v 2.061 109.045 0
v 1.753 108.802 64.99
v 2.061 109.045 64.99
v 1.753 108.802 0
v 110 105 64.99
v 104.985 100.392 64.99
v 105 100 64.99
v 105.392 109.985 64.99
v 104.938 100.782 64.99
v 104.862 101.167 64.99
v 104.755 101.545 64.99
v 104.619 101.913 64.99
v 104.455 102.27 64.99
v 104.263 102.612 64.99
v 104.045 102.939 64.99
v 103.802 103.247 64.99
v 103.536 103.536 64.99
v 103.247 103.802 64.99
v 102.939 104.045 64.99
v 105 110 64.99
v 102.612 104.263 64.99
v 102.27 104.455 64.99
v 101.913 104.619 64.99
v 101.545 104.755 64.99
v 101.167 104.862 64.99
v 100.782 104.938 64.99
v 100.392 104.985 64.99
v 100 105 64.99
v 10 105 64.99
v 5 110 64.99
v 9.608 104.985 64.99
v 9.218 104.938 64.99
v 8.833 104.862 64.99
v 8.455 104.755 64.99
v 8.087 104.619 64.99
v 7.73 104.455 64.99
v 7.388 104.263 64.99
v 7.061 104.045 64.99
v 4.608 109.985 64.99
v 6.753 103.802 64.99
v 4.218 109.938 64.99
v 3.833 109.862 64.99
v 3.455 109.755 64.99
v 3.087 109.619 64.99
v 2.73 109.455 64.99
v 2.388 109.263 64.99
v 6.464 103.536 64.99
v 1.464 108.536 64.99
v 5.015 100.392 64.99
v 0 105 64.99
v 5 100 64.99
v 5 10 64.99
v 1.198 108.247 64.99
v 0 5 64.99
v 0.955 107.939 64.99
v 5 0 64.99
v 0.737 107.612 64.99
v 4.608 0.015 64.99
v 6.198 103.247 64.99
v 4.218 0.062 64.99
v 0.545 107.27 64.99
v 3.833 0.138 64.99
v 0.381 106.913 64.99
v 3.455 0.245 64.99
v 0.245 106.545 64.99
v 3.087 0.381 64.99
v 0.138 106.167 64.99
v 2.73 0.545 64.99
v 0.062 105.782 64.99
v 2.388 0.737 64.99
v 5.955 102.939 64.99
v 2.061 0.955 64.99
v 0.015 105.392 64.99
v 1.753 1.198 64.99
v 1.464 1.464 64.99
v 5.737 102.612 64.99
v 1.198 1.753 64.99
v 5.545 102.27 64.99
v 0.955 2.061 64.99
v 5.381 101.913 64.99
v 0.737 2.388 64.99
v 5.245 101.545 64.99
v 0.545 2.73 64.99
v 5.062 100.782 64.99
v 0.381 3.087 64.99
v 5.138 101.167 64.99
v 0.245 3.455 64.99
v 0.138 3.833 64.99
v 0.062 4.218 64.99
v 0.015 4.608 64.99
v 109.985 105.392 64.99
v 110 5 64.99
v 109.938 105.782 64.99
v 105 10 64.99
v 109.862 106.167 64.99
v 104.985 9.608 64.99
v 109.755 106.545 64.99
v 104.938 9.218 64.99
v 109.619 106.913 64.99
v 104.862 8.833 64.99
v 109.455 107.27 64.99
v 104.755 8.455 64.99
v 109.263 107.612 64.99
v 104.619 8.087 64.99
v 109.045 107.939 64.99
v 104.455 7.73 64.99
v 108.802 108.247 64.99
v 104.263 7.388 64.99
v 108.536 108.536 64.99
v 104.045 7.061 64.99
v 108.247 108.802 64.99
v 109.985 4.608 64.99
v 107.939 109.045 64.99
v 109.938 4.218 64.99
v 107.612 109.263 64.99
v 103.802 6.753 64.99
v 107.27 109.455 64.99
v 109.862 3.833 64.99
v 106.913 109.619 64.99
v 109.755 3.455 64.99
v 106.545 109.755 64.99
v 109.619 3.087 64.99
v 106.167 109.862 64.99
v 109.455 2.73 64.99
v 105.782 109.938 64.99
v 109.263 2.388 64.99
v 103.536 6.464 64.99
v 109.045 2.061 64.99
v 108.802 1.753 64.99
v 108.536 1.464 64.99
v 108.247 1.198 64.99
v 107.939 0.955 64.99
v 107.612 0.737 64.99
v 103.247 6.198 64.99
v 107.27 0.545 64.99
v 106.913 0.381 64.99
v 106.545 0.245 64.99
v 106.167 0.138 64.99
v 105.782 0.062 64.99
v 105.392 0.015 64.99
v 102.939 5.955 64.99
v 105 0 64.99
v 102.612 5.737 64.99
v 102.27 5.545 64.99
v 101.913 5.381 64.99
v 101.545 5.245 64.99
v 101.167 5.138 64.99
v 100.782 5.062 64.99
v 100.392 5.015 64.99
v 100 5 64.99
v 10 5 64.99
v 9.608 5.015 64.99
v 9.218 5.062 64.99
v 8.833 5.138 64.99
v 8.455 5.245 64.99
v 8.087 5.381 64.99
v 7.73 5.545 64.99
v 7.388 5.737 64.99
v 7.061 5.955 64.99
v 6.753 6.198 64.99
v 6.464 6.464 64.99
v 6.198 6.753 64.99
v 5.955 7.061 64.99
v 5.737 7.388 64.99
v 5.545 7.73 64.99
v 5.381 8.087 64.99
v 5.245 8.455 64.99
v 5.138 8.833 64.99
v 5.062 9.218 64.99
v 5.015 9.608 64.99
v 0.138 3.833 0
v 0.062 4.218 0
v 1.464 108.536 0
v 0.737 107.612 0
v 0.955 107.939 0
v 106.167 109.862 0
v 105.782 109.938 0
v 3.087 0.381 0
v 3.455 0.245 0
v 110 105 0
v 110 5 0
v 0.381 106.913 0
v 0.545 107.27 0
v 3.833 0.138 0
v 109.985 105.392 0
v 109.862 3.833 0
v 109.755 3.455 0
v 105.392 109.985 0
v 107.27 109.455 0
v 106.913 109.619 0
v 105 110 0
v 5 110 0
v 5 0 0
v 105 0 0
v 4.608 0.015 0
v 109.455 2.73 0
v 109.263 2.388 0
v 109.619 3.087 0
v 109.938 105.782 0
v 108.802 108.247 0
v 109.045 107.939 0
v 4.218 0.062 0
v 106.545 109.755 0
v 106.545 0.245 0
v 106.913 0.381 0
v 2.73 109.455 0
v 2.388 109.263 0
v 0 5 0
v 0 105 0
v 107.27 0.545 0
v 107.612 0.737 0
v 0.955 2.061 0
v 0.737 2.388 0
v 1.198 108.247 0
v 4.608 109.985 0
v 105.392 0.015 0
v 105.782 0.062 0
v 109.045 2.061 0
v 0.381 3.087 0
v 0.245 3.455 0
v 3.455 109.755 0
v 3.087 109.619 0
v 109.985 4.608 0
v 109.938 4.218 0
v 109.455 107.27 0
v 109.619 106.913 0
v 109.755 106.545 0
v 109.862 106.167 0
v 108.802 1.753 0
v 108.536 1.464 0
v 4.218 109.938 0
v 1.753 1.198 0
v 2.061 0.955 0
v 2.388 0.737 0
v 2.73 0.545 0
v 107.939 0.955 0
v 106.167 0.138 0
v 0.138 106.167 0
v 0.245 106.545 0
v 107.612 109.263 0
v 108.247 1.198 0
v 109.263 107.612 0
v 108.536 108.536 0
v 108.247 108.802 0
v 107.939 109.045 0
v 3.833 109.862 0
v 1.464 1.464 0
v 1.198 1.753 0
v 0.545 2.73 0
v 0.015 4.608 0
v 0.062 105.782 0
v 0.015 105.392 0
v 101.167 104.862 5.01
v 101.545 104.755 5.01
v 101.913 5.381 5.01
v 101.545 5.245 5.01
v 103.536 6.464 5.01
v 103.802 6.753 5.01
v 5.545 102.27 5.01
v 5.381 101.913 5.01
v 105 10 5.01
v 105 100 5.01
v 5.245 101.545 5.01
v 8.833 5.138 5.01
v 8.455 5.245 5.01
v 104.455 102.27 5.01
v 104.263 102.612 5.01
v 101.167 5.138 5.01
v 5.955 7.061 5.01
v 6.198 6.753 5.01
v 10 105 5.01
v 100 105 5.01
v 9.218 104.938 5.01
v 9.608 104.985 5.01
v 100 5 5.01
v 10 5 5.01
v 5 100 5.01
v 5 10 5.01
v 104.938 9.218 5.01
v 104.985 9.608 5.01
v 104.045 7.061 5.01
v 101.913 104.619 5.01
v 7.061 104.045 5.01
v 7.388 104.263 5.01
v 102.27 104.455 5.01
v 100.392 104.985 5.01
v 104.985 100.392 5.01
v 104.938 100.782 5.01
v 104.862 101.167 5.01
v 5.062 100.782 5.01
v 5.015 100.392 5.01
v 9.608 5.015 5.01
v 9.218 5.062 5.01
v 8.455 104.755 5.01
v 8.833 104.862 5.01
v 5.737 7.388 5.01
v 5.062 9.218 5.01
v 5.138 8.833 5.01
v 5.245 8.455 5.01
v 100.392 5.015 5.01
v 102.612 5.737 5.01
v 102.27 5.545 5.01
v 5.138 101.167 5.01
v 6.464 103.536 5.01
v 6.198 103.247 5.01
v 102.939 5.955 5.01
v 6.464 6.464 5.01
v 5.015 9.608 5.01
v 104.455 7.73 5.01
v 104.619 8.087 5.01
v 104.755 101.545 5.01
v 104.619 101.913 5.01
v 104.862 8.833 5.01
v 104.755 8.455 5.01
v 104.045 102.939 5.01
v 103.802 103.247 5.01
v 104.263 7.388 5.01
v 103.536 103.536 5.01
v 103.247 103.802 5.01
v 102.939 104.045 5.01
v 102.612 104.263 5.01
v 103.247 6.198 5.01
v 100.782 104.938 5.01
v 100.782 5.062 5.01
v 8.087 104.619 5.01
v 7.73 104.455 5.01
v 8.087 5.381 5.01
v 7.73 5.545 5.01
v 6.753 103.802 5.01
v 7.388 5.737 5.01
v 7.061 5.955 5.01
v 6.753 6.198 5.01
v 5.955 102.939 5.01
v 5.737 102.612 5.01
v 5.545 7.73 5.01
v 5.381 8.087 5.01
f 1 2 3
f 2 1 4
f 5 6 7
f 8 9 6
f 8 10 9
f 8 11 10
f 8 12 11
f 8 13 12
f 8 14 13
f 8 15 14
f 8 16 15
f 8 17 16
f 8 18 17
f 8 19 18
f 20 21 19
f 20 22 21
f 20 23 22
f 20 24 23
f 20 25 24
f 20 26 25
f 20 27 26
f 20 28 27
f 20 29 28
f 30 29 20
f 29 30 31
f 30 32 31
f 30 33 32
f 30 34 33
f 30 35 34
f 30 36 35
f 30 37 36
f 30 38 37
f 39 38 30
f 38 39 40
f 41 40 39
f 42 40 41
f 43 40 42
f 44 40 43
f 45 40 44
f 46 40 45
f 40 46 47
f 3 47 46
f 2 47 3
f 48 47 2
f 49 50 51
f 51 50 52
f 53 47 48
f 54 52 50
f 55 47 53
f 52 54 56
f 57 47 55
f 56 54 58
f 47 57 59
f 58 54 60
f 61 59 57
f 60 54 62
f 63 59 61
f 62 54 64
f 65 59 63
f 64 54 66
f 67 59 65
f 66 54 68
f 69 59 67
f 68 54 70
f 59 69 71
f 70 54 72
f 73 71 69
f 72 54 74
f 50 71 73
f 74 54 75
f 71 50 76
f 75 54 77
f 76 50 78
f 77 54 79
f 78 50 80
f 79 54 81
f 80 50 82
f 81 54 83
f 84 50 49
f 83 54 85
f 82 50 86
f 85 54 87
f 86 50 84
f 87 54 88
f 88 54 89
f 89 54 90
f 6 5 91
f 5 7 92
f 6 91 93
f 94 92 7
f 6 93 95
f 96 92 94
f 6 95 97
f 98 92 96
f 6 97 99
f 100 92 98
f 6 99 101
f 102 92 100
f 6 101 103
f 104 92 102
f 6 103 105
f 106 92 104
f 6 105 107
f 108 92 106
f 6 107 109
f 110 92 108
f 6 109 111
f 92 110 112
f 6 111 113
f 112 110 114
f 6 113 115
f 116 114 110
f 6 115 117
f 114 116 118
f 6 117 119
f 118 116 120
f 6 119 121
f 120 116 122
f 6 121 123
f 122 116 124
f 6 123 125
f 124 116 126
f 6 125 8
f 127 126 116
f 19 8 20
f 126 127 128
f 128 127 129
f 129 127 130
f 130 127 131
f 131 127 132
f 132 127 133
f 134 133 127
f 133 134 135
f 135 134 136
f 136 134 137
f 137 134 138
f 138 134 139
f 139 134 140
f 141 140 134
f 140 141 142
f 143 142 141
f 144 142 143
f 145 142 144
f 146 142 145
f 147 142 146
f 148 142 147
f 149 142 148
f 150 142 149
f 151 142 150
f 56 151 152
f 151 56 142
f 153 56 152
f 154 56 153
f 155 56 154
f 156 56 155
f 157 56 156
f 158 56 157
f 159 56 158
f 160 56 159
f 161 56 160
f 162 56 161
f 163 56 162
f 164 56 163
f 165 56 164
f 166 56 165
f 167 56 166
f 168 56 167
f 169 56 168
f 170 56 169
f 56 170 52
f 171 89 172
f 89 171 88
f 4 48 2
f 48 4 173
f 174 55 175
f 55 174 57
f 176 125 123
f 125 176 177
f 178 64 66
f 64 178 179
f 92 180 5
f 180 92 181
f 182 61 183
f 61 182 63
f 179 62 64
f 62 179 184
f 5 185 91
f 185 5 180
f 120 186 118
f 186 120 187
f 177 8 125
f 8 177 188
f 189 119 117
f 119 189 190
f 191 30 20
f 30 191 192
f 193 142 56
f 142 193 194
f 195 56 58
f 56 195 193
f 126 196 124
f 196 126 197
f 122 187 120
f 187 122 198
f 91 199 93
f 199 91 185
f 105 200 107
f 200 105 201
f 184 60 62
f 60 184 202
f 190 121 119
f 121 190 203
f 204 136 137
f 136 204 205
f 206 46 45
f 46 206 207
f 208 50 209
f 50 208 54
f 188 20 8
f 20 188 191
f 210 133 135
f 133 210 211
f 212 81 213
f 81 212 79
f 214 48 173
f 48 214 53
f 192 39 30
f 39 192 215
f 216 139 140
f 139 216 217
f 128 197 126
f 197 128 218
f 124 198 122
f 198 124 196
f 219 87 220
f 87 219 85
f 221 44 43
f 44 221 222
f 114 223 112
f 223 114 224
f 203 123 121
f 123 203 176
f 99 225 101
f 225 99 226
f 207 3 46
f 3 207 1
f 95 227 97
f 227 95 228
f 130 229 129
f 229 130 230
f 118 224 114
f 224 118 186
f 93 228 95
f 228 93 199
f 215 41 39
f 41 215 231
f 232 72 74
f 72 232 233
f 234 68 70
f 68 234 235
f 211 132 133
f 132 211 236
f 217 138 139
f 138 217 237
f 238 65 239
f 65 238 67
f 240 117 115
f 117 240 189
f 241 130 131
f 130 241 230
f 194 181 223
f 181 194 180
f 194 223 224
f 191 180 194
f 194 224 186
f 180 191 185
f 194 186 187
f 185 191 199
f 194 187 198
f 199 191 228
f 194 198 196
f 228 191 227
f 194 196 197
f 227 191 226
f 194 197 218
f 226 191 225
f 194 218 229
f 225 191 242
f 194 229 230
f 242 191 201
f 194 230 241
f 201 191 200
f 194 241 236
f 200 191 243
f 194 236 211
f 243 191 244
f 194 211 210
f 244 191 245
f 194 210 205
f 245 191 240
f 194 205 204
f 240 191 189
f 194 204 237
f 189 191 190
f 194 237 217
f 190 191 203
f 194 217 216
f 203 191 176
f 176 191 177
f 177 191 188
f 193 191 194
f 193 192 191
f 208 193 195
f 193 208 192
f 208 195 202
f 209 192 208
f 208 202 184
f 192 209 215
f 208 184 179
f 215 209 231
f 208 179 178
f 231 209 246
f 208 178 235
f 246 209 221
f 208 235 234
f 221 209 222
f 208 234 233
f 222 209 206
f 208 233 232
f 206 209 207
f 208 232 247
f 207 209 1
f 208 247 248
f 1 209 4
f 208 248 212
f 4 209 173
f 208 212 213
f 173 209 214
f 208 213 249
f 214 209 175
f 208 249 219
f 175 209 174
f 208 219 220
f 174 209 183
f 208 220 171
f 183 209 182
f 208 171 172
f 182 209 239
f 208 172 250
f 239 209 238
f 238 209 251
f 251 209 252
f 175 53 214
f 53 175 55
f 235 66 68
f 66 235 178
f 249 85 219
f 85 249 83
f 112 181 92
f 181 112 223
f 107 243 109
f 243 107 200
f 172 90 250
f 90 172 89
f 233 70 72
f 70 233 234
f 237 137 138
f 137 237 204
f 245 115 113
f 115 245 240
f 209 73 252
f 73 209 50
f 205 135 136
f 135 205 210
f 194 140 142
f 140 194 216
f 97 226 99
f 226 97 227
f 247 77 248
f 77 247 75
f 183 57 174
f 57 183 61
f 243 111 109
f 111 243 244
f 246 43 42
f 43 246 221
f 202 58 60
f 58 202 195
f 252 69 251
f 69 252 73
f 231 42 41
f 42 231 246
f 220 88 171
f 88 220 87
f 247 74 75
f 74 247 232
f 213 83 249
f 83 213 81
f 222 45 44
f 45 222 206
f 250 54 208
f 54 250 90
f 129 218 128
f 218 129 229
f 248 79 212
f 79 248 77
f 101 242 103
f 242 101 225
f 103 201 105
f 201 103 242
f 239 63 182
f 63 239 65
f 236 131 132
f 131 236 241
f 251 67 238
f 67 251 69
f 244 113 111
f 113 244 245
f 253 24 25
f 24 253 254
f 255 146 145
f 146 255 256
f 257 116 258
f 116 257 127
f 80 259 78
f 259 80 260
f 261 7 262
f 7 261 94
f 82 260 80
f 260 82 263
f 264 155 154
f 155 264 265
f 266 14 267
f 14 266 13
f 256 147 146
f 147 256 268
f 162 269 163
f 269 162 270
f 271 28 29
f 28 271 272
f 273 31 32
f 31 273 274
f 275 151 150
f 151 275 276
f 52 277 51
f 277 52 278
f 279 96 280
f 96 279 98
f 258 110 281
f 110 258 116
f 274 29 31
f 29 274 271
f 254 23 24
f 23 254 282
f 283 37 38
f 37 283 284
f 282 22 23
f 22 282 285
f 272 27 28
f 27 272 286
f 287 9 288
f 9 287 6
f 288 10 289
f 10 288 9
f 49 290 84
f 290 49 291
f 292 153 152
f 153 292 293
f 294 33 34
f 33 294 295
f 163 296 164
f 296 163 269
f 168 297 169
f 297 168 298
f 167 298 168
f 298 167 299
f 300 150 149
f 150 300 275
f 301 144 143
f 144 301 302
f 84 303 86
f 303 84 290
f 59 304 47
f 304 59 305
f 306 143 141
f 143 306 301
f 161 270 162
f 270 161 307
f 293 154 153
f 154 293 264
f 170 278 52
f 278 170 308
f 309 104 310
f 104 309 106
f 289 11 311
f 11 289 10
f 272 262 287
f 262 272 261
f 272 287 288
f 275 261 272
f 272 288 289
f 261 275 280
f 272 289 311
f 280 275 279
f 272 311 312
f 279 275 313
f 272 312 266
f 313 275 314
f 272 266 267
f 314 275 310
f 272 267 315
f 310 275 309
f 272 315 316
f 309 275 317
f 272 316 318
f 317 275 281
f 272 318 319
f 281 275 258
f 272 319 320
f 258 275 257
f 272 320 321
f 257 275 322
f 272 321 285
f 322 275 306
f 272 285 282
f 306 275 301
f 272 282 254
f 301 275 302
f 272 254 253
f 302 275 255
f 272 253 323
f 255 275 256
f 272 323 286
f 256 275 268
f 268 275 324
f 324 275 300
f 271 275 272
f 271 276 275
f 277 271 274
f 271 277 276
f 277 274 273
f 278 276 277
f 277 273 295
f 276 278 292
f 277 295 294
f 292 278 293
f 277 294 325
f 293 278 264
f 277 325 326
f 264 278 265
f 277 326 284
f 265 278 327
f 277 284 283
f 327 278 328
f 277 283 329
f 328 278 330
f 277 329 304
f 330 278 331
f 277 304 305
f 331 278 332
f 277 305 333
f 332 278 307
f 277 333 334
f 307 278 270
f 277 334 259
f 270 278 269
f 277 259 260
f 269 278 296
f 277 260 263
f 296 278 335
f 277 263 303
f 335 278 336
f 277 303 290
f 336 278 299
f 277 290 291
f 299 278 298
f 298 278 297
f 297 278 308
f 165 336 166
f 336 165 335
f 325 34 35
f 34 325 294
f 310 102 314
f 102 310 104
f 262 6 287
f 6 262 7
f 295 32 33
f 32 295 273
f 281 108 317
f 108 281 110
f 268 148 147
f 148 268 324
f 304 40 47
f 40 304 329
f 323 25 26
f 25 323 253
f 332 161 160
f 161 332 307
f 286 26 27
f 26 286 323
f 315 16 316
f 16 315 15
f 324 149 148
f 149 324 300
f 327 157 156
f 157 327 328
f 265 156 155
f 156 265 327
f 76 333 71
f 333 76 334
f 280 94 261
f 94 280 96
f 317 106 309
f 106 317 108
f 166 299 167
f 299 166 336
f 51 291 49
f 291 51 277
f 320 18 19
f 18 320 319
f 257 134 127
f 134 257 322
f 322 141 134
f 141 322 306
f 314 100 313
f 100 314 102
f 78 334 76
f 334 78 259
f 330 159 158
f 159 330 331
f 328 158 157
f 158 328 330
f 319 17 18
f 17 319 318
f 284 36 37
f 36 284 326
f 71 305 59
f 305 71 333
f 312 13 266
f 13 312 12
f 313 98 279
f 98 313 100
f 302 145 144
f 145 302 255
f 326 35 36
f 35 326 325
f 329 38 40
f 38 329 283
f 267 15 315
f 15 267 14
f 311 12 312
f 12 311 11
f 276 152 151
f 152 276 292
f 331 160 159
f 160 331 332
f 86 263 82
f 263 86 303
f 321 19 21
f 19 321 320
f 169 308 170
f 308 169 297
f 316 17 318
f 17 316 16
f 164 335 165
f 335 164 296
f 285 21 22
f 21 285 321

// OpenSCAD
/*
makerspace workshop 2023-09-02
author: andimoto
*/
$fn=80;

/* [box dimensions] */
innerBoxX = 100;
innerBoxY = 100;
innerBoxZ = 60;

wallThickness = 5;
bottomThickness = 5;

edgeRadius = 5;

/* [ other parameters ] */
extra = 0.01;

module box()
{
  difference()
  {
    translate([edgeRadius,edgeRadius,0])
    minkowski()
    {
      cube([innerBoxX+wallThickness*2-edgeRadius*2,
        innerBoxY+wallThickness*2-edgeRadius*2,
        innerBoxZ+bottomThickness-extra*2]);
      cylinder(r=edgeRadius, h=extra);
    }

    translate([edgeRadius+wallThickness,edgeRadius+wallThickness,bottomThickness+extra])
    minkowski()
    {
      cube([innerBoxX-edgeRadius*2,
        innerBoxY-edgeRadius*2,
        innerBoxZ-extra*2]);
      cylinder(r=edgeRadius, h=extra);
    }
  }
}

box();
